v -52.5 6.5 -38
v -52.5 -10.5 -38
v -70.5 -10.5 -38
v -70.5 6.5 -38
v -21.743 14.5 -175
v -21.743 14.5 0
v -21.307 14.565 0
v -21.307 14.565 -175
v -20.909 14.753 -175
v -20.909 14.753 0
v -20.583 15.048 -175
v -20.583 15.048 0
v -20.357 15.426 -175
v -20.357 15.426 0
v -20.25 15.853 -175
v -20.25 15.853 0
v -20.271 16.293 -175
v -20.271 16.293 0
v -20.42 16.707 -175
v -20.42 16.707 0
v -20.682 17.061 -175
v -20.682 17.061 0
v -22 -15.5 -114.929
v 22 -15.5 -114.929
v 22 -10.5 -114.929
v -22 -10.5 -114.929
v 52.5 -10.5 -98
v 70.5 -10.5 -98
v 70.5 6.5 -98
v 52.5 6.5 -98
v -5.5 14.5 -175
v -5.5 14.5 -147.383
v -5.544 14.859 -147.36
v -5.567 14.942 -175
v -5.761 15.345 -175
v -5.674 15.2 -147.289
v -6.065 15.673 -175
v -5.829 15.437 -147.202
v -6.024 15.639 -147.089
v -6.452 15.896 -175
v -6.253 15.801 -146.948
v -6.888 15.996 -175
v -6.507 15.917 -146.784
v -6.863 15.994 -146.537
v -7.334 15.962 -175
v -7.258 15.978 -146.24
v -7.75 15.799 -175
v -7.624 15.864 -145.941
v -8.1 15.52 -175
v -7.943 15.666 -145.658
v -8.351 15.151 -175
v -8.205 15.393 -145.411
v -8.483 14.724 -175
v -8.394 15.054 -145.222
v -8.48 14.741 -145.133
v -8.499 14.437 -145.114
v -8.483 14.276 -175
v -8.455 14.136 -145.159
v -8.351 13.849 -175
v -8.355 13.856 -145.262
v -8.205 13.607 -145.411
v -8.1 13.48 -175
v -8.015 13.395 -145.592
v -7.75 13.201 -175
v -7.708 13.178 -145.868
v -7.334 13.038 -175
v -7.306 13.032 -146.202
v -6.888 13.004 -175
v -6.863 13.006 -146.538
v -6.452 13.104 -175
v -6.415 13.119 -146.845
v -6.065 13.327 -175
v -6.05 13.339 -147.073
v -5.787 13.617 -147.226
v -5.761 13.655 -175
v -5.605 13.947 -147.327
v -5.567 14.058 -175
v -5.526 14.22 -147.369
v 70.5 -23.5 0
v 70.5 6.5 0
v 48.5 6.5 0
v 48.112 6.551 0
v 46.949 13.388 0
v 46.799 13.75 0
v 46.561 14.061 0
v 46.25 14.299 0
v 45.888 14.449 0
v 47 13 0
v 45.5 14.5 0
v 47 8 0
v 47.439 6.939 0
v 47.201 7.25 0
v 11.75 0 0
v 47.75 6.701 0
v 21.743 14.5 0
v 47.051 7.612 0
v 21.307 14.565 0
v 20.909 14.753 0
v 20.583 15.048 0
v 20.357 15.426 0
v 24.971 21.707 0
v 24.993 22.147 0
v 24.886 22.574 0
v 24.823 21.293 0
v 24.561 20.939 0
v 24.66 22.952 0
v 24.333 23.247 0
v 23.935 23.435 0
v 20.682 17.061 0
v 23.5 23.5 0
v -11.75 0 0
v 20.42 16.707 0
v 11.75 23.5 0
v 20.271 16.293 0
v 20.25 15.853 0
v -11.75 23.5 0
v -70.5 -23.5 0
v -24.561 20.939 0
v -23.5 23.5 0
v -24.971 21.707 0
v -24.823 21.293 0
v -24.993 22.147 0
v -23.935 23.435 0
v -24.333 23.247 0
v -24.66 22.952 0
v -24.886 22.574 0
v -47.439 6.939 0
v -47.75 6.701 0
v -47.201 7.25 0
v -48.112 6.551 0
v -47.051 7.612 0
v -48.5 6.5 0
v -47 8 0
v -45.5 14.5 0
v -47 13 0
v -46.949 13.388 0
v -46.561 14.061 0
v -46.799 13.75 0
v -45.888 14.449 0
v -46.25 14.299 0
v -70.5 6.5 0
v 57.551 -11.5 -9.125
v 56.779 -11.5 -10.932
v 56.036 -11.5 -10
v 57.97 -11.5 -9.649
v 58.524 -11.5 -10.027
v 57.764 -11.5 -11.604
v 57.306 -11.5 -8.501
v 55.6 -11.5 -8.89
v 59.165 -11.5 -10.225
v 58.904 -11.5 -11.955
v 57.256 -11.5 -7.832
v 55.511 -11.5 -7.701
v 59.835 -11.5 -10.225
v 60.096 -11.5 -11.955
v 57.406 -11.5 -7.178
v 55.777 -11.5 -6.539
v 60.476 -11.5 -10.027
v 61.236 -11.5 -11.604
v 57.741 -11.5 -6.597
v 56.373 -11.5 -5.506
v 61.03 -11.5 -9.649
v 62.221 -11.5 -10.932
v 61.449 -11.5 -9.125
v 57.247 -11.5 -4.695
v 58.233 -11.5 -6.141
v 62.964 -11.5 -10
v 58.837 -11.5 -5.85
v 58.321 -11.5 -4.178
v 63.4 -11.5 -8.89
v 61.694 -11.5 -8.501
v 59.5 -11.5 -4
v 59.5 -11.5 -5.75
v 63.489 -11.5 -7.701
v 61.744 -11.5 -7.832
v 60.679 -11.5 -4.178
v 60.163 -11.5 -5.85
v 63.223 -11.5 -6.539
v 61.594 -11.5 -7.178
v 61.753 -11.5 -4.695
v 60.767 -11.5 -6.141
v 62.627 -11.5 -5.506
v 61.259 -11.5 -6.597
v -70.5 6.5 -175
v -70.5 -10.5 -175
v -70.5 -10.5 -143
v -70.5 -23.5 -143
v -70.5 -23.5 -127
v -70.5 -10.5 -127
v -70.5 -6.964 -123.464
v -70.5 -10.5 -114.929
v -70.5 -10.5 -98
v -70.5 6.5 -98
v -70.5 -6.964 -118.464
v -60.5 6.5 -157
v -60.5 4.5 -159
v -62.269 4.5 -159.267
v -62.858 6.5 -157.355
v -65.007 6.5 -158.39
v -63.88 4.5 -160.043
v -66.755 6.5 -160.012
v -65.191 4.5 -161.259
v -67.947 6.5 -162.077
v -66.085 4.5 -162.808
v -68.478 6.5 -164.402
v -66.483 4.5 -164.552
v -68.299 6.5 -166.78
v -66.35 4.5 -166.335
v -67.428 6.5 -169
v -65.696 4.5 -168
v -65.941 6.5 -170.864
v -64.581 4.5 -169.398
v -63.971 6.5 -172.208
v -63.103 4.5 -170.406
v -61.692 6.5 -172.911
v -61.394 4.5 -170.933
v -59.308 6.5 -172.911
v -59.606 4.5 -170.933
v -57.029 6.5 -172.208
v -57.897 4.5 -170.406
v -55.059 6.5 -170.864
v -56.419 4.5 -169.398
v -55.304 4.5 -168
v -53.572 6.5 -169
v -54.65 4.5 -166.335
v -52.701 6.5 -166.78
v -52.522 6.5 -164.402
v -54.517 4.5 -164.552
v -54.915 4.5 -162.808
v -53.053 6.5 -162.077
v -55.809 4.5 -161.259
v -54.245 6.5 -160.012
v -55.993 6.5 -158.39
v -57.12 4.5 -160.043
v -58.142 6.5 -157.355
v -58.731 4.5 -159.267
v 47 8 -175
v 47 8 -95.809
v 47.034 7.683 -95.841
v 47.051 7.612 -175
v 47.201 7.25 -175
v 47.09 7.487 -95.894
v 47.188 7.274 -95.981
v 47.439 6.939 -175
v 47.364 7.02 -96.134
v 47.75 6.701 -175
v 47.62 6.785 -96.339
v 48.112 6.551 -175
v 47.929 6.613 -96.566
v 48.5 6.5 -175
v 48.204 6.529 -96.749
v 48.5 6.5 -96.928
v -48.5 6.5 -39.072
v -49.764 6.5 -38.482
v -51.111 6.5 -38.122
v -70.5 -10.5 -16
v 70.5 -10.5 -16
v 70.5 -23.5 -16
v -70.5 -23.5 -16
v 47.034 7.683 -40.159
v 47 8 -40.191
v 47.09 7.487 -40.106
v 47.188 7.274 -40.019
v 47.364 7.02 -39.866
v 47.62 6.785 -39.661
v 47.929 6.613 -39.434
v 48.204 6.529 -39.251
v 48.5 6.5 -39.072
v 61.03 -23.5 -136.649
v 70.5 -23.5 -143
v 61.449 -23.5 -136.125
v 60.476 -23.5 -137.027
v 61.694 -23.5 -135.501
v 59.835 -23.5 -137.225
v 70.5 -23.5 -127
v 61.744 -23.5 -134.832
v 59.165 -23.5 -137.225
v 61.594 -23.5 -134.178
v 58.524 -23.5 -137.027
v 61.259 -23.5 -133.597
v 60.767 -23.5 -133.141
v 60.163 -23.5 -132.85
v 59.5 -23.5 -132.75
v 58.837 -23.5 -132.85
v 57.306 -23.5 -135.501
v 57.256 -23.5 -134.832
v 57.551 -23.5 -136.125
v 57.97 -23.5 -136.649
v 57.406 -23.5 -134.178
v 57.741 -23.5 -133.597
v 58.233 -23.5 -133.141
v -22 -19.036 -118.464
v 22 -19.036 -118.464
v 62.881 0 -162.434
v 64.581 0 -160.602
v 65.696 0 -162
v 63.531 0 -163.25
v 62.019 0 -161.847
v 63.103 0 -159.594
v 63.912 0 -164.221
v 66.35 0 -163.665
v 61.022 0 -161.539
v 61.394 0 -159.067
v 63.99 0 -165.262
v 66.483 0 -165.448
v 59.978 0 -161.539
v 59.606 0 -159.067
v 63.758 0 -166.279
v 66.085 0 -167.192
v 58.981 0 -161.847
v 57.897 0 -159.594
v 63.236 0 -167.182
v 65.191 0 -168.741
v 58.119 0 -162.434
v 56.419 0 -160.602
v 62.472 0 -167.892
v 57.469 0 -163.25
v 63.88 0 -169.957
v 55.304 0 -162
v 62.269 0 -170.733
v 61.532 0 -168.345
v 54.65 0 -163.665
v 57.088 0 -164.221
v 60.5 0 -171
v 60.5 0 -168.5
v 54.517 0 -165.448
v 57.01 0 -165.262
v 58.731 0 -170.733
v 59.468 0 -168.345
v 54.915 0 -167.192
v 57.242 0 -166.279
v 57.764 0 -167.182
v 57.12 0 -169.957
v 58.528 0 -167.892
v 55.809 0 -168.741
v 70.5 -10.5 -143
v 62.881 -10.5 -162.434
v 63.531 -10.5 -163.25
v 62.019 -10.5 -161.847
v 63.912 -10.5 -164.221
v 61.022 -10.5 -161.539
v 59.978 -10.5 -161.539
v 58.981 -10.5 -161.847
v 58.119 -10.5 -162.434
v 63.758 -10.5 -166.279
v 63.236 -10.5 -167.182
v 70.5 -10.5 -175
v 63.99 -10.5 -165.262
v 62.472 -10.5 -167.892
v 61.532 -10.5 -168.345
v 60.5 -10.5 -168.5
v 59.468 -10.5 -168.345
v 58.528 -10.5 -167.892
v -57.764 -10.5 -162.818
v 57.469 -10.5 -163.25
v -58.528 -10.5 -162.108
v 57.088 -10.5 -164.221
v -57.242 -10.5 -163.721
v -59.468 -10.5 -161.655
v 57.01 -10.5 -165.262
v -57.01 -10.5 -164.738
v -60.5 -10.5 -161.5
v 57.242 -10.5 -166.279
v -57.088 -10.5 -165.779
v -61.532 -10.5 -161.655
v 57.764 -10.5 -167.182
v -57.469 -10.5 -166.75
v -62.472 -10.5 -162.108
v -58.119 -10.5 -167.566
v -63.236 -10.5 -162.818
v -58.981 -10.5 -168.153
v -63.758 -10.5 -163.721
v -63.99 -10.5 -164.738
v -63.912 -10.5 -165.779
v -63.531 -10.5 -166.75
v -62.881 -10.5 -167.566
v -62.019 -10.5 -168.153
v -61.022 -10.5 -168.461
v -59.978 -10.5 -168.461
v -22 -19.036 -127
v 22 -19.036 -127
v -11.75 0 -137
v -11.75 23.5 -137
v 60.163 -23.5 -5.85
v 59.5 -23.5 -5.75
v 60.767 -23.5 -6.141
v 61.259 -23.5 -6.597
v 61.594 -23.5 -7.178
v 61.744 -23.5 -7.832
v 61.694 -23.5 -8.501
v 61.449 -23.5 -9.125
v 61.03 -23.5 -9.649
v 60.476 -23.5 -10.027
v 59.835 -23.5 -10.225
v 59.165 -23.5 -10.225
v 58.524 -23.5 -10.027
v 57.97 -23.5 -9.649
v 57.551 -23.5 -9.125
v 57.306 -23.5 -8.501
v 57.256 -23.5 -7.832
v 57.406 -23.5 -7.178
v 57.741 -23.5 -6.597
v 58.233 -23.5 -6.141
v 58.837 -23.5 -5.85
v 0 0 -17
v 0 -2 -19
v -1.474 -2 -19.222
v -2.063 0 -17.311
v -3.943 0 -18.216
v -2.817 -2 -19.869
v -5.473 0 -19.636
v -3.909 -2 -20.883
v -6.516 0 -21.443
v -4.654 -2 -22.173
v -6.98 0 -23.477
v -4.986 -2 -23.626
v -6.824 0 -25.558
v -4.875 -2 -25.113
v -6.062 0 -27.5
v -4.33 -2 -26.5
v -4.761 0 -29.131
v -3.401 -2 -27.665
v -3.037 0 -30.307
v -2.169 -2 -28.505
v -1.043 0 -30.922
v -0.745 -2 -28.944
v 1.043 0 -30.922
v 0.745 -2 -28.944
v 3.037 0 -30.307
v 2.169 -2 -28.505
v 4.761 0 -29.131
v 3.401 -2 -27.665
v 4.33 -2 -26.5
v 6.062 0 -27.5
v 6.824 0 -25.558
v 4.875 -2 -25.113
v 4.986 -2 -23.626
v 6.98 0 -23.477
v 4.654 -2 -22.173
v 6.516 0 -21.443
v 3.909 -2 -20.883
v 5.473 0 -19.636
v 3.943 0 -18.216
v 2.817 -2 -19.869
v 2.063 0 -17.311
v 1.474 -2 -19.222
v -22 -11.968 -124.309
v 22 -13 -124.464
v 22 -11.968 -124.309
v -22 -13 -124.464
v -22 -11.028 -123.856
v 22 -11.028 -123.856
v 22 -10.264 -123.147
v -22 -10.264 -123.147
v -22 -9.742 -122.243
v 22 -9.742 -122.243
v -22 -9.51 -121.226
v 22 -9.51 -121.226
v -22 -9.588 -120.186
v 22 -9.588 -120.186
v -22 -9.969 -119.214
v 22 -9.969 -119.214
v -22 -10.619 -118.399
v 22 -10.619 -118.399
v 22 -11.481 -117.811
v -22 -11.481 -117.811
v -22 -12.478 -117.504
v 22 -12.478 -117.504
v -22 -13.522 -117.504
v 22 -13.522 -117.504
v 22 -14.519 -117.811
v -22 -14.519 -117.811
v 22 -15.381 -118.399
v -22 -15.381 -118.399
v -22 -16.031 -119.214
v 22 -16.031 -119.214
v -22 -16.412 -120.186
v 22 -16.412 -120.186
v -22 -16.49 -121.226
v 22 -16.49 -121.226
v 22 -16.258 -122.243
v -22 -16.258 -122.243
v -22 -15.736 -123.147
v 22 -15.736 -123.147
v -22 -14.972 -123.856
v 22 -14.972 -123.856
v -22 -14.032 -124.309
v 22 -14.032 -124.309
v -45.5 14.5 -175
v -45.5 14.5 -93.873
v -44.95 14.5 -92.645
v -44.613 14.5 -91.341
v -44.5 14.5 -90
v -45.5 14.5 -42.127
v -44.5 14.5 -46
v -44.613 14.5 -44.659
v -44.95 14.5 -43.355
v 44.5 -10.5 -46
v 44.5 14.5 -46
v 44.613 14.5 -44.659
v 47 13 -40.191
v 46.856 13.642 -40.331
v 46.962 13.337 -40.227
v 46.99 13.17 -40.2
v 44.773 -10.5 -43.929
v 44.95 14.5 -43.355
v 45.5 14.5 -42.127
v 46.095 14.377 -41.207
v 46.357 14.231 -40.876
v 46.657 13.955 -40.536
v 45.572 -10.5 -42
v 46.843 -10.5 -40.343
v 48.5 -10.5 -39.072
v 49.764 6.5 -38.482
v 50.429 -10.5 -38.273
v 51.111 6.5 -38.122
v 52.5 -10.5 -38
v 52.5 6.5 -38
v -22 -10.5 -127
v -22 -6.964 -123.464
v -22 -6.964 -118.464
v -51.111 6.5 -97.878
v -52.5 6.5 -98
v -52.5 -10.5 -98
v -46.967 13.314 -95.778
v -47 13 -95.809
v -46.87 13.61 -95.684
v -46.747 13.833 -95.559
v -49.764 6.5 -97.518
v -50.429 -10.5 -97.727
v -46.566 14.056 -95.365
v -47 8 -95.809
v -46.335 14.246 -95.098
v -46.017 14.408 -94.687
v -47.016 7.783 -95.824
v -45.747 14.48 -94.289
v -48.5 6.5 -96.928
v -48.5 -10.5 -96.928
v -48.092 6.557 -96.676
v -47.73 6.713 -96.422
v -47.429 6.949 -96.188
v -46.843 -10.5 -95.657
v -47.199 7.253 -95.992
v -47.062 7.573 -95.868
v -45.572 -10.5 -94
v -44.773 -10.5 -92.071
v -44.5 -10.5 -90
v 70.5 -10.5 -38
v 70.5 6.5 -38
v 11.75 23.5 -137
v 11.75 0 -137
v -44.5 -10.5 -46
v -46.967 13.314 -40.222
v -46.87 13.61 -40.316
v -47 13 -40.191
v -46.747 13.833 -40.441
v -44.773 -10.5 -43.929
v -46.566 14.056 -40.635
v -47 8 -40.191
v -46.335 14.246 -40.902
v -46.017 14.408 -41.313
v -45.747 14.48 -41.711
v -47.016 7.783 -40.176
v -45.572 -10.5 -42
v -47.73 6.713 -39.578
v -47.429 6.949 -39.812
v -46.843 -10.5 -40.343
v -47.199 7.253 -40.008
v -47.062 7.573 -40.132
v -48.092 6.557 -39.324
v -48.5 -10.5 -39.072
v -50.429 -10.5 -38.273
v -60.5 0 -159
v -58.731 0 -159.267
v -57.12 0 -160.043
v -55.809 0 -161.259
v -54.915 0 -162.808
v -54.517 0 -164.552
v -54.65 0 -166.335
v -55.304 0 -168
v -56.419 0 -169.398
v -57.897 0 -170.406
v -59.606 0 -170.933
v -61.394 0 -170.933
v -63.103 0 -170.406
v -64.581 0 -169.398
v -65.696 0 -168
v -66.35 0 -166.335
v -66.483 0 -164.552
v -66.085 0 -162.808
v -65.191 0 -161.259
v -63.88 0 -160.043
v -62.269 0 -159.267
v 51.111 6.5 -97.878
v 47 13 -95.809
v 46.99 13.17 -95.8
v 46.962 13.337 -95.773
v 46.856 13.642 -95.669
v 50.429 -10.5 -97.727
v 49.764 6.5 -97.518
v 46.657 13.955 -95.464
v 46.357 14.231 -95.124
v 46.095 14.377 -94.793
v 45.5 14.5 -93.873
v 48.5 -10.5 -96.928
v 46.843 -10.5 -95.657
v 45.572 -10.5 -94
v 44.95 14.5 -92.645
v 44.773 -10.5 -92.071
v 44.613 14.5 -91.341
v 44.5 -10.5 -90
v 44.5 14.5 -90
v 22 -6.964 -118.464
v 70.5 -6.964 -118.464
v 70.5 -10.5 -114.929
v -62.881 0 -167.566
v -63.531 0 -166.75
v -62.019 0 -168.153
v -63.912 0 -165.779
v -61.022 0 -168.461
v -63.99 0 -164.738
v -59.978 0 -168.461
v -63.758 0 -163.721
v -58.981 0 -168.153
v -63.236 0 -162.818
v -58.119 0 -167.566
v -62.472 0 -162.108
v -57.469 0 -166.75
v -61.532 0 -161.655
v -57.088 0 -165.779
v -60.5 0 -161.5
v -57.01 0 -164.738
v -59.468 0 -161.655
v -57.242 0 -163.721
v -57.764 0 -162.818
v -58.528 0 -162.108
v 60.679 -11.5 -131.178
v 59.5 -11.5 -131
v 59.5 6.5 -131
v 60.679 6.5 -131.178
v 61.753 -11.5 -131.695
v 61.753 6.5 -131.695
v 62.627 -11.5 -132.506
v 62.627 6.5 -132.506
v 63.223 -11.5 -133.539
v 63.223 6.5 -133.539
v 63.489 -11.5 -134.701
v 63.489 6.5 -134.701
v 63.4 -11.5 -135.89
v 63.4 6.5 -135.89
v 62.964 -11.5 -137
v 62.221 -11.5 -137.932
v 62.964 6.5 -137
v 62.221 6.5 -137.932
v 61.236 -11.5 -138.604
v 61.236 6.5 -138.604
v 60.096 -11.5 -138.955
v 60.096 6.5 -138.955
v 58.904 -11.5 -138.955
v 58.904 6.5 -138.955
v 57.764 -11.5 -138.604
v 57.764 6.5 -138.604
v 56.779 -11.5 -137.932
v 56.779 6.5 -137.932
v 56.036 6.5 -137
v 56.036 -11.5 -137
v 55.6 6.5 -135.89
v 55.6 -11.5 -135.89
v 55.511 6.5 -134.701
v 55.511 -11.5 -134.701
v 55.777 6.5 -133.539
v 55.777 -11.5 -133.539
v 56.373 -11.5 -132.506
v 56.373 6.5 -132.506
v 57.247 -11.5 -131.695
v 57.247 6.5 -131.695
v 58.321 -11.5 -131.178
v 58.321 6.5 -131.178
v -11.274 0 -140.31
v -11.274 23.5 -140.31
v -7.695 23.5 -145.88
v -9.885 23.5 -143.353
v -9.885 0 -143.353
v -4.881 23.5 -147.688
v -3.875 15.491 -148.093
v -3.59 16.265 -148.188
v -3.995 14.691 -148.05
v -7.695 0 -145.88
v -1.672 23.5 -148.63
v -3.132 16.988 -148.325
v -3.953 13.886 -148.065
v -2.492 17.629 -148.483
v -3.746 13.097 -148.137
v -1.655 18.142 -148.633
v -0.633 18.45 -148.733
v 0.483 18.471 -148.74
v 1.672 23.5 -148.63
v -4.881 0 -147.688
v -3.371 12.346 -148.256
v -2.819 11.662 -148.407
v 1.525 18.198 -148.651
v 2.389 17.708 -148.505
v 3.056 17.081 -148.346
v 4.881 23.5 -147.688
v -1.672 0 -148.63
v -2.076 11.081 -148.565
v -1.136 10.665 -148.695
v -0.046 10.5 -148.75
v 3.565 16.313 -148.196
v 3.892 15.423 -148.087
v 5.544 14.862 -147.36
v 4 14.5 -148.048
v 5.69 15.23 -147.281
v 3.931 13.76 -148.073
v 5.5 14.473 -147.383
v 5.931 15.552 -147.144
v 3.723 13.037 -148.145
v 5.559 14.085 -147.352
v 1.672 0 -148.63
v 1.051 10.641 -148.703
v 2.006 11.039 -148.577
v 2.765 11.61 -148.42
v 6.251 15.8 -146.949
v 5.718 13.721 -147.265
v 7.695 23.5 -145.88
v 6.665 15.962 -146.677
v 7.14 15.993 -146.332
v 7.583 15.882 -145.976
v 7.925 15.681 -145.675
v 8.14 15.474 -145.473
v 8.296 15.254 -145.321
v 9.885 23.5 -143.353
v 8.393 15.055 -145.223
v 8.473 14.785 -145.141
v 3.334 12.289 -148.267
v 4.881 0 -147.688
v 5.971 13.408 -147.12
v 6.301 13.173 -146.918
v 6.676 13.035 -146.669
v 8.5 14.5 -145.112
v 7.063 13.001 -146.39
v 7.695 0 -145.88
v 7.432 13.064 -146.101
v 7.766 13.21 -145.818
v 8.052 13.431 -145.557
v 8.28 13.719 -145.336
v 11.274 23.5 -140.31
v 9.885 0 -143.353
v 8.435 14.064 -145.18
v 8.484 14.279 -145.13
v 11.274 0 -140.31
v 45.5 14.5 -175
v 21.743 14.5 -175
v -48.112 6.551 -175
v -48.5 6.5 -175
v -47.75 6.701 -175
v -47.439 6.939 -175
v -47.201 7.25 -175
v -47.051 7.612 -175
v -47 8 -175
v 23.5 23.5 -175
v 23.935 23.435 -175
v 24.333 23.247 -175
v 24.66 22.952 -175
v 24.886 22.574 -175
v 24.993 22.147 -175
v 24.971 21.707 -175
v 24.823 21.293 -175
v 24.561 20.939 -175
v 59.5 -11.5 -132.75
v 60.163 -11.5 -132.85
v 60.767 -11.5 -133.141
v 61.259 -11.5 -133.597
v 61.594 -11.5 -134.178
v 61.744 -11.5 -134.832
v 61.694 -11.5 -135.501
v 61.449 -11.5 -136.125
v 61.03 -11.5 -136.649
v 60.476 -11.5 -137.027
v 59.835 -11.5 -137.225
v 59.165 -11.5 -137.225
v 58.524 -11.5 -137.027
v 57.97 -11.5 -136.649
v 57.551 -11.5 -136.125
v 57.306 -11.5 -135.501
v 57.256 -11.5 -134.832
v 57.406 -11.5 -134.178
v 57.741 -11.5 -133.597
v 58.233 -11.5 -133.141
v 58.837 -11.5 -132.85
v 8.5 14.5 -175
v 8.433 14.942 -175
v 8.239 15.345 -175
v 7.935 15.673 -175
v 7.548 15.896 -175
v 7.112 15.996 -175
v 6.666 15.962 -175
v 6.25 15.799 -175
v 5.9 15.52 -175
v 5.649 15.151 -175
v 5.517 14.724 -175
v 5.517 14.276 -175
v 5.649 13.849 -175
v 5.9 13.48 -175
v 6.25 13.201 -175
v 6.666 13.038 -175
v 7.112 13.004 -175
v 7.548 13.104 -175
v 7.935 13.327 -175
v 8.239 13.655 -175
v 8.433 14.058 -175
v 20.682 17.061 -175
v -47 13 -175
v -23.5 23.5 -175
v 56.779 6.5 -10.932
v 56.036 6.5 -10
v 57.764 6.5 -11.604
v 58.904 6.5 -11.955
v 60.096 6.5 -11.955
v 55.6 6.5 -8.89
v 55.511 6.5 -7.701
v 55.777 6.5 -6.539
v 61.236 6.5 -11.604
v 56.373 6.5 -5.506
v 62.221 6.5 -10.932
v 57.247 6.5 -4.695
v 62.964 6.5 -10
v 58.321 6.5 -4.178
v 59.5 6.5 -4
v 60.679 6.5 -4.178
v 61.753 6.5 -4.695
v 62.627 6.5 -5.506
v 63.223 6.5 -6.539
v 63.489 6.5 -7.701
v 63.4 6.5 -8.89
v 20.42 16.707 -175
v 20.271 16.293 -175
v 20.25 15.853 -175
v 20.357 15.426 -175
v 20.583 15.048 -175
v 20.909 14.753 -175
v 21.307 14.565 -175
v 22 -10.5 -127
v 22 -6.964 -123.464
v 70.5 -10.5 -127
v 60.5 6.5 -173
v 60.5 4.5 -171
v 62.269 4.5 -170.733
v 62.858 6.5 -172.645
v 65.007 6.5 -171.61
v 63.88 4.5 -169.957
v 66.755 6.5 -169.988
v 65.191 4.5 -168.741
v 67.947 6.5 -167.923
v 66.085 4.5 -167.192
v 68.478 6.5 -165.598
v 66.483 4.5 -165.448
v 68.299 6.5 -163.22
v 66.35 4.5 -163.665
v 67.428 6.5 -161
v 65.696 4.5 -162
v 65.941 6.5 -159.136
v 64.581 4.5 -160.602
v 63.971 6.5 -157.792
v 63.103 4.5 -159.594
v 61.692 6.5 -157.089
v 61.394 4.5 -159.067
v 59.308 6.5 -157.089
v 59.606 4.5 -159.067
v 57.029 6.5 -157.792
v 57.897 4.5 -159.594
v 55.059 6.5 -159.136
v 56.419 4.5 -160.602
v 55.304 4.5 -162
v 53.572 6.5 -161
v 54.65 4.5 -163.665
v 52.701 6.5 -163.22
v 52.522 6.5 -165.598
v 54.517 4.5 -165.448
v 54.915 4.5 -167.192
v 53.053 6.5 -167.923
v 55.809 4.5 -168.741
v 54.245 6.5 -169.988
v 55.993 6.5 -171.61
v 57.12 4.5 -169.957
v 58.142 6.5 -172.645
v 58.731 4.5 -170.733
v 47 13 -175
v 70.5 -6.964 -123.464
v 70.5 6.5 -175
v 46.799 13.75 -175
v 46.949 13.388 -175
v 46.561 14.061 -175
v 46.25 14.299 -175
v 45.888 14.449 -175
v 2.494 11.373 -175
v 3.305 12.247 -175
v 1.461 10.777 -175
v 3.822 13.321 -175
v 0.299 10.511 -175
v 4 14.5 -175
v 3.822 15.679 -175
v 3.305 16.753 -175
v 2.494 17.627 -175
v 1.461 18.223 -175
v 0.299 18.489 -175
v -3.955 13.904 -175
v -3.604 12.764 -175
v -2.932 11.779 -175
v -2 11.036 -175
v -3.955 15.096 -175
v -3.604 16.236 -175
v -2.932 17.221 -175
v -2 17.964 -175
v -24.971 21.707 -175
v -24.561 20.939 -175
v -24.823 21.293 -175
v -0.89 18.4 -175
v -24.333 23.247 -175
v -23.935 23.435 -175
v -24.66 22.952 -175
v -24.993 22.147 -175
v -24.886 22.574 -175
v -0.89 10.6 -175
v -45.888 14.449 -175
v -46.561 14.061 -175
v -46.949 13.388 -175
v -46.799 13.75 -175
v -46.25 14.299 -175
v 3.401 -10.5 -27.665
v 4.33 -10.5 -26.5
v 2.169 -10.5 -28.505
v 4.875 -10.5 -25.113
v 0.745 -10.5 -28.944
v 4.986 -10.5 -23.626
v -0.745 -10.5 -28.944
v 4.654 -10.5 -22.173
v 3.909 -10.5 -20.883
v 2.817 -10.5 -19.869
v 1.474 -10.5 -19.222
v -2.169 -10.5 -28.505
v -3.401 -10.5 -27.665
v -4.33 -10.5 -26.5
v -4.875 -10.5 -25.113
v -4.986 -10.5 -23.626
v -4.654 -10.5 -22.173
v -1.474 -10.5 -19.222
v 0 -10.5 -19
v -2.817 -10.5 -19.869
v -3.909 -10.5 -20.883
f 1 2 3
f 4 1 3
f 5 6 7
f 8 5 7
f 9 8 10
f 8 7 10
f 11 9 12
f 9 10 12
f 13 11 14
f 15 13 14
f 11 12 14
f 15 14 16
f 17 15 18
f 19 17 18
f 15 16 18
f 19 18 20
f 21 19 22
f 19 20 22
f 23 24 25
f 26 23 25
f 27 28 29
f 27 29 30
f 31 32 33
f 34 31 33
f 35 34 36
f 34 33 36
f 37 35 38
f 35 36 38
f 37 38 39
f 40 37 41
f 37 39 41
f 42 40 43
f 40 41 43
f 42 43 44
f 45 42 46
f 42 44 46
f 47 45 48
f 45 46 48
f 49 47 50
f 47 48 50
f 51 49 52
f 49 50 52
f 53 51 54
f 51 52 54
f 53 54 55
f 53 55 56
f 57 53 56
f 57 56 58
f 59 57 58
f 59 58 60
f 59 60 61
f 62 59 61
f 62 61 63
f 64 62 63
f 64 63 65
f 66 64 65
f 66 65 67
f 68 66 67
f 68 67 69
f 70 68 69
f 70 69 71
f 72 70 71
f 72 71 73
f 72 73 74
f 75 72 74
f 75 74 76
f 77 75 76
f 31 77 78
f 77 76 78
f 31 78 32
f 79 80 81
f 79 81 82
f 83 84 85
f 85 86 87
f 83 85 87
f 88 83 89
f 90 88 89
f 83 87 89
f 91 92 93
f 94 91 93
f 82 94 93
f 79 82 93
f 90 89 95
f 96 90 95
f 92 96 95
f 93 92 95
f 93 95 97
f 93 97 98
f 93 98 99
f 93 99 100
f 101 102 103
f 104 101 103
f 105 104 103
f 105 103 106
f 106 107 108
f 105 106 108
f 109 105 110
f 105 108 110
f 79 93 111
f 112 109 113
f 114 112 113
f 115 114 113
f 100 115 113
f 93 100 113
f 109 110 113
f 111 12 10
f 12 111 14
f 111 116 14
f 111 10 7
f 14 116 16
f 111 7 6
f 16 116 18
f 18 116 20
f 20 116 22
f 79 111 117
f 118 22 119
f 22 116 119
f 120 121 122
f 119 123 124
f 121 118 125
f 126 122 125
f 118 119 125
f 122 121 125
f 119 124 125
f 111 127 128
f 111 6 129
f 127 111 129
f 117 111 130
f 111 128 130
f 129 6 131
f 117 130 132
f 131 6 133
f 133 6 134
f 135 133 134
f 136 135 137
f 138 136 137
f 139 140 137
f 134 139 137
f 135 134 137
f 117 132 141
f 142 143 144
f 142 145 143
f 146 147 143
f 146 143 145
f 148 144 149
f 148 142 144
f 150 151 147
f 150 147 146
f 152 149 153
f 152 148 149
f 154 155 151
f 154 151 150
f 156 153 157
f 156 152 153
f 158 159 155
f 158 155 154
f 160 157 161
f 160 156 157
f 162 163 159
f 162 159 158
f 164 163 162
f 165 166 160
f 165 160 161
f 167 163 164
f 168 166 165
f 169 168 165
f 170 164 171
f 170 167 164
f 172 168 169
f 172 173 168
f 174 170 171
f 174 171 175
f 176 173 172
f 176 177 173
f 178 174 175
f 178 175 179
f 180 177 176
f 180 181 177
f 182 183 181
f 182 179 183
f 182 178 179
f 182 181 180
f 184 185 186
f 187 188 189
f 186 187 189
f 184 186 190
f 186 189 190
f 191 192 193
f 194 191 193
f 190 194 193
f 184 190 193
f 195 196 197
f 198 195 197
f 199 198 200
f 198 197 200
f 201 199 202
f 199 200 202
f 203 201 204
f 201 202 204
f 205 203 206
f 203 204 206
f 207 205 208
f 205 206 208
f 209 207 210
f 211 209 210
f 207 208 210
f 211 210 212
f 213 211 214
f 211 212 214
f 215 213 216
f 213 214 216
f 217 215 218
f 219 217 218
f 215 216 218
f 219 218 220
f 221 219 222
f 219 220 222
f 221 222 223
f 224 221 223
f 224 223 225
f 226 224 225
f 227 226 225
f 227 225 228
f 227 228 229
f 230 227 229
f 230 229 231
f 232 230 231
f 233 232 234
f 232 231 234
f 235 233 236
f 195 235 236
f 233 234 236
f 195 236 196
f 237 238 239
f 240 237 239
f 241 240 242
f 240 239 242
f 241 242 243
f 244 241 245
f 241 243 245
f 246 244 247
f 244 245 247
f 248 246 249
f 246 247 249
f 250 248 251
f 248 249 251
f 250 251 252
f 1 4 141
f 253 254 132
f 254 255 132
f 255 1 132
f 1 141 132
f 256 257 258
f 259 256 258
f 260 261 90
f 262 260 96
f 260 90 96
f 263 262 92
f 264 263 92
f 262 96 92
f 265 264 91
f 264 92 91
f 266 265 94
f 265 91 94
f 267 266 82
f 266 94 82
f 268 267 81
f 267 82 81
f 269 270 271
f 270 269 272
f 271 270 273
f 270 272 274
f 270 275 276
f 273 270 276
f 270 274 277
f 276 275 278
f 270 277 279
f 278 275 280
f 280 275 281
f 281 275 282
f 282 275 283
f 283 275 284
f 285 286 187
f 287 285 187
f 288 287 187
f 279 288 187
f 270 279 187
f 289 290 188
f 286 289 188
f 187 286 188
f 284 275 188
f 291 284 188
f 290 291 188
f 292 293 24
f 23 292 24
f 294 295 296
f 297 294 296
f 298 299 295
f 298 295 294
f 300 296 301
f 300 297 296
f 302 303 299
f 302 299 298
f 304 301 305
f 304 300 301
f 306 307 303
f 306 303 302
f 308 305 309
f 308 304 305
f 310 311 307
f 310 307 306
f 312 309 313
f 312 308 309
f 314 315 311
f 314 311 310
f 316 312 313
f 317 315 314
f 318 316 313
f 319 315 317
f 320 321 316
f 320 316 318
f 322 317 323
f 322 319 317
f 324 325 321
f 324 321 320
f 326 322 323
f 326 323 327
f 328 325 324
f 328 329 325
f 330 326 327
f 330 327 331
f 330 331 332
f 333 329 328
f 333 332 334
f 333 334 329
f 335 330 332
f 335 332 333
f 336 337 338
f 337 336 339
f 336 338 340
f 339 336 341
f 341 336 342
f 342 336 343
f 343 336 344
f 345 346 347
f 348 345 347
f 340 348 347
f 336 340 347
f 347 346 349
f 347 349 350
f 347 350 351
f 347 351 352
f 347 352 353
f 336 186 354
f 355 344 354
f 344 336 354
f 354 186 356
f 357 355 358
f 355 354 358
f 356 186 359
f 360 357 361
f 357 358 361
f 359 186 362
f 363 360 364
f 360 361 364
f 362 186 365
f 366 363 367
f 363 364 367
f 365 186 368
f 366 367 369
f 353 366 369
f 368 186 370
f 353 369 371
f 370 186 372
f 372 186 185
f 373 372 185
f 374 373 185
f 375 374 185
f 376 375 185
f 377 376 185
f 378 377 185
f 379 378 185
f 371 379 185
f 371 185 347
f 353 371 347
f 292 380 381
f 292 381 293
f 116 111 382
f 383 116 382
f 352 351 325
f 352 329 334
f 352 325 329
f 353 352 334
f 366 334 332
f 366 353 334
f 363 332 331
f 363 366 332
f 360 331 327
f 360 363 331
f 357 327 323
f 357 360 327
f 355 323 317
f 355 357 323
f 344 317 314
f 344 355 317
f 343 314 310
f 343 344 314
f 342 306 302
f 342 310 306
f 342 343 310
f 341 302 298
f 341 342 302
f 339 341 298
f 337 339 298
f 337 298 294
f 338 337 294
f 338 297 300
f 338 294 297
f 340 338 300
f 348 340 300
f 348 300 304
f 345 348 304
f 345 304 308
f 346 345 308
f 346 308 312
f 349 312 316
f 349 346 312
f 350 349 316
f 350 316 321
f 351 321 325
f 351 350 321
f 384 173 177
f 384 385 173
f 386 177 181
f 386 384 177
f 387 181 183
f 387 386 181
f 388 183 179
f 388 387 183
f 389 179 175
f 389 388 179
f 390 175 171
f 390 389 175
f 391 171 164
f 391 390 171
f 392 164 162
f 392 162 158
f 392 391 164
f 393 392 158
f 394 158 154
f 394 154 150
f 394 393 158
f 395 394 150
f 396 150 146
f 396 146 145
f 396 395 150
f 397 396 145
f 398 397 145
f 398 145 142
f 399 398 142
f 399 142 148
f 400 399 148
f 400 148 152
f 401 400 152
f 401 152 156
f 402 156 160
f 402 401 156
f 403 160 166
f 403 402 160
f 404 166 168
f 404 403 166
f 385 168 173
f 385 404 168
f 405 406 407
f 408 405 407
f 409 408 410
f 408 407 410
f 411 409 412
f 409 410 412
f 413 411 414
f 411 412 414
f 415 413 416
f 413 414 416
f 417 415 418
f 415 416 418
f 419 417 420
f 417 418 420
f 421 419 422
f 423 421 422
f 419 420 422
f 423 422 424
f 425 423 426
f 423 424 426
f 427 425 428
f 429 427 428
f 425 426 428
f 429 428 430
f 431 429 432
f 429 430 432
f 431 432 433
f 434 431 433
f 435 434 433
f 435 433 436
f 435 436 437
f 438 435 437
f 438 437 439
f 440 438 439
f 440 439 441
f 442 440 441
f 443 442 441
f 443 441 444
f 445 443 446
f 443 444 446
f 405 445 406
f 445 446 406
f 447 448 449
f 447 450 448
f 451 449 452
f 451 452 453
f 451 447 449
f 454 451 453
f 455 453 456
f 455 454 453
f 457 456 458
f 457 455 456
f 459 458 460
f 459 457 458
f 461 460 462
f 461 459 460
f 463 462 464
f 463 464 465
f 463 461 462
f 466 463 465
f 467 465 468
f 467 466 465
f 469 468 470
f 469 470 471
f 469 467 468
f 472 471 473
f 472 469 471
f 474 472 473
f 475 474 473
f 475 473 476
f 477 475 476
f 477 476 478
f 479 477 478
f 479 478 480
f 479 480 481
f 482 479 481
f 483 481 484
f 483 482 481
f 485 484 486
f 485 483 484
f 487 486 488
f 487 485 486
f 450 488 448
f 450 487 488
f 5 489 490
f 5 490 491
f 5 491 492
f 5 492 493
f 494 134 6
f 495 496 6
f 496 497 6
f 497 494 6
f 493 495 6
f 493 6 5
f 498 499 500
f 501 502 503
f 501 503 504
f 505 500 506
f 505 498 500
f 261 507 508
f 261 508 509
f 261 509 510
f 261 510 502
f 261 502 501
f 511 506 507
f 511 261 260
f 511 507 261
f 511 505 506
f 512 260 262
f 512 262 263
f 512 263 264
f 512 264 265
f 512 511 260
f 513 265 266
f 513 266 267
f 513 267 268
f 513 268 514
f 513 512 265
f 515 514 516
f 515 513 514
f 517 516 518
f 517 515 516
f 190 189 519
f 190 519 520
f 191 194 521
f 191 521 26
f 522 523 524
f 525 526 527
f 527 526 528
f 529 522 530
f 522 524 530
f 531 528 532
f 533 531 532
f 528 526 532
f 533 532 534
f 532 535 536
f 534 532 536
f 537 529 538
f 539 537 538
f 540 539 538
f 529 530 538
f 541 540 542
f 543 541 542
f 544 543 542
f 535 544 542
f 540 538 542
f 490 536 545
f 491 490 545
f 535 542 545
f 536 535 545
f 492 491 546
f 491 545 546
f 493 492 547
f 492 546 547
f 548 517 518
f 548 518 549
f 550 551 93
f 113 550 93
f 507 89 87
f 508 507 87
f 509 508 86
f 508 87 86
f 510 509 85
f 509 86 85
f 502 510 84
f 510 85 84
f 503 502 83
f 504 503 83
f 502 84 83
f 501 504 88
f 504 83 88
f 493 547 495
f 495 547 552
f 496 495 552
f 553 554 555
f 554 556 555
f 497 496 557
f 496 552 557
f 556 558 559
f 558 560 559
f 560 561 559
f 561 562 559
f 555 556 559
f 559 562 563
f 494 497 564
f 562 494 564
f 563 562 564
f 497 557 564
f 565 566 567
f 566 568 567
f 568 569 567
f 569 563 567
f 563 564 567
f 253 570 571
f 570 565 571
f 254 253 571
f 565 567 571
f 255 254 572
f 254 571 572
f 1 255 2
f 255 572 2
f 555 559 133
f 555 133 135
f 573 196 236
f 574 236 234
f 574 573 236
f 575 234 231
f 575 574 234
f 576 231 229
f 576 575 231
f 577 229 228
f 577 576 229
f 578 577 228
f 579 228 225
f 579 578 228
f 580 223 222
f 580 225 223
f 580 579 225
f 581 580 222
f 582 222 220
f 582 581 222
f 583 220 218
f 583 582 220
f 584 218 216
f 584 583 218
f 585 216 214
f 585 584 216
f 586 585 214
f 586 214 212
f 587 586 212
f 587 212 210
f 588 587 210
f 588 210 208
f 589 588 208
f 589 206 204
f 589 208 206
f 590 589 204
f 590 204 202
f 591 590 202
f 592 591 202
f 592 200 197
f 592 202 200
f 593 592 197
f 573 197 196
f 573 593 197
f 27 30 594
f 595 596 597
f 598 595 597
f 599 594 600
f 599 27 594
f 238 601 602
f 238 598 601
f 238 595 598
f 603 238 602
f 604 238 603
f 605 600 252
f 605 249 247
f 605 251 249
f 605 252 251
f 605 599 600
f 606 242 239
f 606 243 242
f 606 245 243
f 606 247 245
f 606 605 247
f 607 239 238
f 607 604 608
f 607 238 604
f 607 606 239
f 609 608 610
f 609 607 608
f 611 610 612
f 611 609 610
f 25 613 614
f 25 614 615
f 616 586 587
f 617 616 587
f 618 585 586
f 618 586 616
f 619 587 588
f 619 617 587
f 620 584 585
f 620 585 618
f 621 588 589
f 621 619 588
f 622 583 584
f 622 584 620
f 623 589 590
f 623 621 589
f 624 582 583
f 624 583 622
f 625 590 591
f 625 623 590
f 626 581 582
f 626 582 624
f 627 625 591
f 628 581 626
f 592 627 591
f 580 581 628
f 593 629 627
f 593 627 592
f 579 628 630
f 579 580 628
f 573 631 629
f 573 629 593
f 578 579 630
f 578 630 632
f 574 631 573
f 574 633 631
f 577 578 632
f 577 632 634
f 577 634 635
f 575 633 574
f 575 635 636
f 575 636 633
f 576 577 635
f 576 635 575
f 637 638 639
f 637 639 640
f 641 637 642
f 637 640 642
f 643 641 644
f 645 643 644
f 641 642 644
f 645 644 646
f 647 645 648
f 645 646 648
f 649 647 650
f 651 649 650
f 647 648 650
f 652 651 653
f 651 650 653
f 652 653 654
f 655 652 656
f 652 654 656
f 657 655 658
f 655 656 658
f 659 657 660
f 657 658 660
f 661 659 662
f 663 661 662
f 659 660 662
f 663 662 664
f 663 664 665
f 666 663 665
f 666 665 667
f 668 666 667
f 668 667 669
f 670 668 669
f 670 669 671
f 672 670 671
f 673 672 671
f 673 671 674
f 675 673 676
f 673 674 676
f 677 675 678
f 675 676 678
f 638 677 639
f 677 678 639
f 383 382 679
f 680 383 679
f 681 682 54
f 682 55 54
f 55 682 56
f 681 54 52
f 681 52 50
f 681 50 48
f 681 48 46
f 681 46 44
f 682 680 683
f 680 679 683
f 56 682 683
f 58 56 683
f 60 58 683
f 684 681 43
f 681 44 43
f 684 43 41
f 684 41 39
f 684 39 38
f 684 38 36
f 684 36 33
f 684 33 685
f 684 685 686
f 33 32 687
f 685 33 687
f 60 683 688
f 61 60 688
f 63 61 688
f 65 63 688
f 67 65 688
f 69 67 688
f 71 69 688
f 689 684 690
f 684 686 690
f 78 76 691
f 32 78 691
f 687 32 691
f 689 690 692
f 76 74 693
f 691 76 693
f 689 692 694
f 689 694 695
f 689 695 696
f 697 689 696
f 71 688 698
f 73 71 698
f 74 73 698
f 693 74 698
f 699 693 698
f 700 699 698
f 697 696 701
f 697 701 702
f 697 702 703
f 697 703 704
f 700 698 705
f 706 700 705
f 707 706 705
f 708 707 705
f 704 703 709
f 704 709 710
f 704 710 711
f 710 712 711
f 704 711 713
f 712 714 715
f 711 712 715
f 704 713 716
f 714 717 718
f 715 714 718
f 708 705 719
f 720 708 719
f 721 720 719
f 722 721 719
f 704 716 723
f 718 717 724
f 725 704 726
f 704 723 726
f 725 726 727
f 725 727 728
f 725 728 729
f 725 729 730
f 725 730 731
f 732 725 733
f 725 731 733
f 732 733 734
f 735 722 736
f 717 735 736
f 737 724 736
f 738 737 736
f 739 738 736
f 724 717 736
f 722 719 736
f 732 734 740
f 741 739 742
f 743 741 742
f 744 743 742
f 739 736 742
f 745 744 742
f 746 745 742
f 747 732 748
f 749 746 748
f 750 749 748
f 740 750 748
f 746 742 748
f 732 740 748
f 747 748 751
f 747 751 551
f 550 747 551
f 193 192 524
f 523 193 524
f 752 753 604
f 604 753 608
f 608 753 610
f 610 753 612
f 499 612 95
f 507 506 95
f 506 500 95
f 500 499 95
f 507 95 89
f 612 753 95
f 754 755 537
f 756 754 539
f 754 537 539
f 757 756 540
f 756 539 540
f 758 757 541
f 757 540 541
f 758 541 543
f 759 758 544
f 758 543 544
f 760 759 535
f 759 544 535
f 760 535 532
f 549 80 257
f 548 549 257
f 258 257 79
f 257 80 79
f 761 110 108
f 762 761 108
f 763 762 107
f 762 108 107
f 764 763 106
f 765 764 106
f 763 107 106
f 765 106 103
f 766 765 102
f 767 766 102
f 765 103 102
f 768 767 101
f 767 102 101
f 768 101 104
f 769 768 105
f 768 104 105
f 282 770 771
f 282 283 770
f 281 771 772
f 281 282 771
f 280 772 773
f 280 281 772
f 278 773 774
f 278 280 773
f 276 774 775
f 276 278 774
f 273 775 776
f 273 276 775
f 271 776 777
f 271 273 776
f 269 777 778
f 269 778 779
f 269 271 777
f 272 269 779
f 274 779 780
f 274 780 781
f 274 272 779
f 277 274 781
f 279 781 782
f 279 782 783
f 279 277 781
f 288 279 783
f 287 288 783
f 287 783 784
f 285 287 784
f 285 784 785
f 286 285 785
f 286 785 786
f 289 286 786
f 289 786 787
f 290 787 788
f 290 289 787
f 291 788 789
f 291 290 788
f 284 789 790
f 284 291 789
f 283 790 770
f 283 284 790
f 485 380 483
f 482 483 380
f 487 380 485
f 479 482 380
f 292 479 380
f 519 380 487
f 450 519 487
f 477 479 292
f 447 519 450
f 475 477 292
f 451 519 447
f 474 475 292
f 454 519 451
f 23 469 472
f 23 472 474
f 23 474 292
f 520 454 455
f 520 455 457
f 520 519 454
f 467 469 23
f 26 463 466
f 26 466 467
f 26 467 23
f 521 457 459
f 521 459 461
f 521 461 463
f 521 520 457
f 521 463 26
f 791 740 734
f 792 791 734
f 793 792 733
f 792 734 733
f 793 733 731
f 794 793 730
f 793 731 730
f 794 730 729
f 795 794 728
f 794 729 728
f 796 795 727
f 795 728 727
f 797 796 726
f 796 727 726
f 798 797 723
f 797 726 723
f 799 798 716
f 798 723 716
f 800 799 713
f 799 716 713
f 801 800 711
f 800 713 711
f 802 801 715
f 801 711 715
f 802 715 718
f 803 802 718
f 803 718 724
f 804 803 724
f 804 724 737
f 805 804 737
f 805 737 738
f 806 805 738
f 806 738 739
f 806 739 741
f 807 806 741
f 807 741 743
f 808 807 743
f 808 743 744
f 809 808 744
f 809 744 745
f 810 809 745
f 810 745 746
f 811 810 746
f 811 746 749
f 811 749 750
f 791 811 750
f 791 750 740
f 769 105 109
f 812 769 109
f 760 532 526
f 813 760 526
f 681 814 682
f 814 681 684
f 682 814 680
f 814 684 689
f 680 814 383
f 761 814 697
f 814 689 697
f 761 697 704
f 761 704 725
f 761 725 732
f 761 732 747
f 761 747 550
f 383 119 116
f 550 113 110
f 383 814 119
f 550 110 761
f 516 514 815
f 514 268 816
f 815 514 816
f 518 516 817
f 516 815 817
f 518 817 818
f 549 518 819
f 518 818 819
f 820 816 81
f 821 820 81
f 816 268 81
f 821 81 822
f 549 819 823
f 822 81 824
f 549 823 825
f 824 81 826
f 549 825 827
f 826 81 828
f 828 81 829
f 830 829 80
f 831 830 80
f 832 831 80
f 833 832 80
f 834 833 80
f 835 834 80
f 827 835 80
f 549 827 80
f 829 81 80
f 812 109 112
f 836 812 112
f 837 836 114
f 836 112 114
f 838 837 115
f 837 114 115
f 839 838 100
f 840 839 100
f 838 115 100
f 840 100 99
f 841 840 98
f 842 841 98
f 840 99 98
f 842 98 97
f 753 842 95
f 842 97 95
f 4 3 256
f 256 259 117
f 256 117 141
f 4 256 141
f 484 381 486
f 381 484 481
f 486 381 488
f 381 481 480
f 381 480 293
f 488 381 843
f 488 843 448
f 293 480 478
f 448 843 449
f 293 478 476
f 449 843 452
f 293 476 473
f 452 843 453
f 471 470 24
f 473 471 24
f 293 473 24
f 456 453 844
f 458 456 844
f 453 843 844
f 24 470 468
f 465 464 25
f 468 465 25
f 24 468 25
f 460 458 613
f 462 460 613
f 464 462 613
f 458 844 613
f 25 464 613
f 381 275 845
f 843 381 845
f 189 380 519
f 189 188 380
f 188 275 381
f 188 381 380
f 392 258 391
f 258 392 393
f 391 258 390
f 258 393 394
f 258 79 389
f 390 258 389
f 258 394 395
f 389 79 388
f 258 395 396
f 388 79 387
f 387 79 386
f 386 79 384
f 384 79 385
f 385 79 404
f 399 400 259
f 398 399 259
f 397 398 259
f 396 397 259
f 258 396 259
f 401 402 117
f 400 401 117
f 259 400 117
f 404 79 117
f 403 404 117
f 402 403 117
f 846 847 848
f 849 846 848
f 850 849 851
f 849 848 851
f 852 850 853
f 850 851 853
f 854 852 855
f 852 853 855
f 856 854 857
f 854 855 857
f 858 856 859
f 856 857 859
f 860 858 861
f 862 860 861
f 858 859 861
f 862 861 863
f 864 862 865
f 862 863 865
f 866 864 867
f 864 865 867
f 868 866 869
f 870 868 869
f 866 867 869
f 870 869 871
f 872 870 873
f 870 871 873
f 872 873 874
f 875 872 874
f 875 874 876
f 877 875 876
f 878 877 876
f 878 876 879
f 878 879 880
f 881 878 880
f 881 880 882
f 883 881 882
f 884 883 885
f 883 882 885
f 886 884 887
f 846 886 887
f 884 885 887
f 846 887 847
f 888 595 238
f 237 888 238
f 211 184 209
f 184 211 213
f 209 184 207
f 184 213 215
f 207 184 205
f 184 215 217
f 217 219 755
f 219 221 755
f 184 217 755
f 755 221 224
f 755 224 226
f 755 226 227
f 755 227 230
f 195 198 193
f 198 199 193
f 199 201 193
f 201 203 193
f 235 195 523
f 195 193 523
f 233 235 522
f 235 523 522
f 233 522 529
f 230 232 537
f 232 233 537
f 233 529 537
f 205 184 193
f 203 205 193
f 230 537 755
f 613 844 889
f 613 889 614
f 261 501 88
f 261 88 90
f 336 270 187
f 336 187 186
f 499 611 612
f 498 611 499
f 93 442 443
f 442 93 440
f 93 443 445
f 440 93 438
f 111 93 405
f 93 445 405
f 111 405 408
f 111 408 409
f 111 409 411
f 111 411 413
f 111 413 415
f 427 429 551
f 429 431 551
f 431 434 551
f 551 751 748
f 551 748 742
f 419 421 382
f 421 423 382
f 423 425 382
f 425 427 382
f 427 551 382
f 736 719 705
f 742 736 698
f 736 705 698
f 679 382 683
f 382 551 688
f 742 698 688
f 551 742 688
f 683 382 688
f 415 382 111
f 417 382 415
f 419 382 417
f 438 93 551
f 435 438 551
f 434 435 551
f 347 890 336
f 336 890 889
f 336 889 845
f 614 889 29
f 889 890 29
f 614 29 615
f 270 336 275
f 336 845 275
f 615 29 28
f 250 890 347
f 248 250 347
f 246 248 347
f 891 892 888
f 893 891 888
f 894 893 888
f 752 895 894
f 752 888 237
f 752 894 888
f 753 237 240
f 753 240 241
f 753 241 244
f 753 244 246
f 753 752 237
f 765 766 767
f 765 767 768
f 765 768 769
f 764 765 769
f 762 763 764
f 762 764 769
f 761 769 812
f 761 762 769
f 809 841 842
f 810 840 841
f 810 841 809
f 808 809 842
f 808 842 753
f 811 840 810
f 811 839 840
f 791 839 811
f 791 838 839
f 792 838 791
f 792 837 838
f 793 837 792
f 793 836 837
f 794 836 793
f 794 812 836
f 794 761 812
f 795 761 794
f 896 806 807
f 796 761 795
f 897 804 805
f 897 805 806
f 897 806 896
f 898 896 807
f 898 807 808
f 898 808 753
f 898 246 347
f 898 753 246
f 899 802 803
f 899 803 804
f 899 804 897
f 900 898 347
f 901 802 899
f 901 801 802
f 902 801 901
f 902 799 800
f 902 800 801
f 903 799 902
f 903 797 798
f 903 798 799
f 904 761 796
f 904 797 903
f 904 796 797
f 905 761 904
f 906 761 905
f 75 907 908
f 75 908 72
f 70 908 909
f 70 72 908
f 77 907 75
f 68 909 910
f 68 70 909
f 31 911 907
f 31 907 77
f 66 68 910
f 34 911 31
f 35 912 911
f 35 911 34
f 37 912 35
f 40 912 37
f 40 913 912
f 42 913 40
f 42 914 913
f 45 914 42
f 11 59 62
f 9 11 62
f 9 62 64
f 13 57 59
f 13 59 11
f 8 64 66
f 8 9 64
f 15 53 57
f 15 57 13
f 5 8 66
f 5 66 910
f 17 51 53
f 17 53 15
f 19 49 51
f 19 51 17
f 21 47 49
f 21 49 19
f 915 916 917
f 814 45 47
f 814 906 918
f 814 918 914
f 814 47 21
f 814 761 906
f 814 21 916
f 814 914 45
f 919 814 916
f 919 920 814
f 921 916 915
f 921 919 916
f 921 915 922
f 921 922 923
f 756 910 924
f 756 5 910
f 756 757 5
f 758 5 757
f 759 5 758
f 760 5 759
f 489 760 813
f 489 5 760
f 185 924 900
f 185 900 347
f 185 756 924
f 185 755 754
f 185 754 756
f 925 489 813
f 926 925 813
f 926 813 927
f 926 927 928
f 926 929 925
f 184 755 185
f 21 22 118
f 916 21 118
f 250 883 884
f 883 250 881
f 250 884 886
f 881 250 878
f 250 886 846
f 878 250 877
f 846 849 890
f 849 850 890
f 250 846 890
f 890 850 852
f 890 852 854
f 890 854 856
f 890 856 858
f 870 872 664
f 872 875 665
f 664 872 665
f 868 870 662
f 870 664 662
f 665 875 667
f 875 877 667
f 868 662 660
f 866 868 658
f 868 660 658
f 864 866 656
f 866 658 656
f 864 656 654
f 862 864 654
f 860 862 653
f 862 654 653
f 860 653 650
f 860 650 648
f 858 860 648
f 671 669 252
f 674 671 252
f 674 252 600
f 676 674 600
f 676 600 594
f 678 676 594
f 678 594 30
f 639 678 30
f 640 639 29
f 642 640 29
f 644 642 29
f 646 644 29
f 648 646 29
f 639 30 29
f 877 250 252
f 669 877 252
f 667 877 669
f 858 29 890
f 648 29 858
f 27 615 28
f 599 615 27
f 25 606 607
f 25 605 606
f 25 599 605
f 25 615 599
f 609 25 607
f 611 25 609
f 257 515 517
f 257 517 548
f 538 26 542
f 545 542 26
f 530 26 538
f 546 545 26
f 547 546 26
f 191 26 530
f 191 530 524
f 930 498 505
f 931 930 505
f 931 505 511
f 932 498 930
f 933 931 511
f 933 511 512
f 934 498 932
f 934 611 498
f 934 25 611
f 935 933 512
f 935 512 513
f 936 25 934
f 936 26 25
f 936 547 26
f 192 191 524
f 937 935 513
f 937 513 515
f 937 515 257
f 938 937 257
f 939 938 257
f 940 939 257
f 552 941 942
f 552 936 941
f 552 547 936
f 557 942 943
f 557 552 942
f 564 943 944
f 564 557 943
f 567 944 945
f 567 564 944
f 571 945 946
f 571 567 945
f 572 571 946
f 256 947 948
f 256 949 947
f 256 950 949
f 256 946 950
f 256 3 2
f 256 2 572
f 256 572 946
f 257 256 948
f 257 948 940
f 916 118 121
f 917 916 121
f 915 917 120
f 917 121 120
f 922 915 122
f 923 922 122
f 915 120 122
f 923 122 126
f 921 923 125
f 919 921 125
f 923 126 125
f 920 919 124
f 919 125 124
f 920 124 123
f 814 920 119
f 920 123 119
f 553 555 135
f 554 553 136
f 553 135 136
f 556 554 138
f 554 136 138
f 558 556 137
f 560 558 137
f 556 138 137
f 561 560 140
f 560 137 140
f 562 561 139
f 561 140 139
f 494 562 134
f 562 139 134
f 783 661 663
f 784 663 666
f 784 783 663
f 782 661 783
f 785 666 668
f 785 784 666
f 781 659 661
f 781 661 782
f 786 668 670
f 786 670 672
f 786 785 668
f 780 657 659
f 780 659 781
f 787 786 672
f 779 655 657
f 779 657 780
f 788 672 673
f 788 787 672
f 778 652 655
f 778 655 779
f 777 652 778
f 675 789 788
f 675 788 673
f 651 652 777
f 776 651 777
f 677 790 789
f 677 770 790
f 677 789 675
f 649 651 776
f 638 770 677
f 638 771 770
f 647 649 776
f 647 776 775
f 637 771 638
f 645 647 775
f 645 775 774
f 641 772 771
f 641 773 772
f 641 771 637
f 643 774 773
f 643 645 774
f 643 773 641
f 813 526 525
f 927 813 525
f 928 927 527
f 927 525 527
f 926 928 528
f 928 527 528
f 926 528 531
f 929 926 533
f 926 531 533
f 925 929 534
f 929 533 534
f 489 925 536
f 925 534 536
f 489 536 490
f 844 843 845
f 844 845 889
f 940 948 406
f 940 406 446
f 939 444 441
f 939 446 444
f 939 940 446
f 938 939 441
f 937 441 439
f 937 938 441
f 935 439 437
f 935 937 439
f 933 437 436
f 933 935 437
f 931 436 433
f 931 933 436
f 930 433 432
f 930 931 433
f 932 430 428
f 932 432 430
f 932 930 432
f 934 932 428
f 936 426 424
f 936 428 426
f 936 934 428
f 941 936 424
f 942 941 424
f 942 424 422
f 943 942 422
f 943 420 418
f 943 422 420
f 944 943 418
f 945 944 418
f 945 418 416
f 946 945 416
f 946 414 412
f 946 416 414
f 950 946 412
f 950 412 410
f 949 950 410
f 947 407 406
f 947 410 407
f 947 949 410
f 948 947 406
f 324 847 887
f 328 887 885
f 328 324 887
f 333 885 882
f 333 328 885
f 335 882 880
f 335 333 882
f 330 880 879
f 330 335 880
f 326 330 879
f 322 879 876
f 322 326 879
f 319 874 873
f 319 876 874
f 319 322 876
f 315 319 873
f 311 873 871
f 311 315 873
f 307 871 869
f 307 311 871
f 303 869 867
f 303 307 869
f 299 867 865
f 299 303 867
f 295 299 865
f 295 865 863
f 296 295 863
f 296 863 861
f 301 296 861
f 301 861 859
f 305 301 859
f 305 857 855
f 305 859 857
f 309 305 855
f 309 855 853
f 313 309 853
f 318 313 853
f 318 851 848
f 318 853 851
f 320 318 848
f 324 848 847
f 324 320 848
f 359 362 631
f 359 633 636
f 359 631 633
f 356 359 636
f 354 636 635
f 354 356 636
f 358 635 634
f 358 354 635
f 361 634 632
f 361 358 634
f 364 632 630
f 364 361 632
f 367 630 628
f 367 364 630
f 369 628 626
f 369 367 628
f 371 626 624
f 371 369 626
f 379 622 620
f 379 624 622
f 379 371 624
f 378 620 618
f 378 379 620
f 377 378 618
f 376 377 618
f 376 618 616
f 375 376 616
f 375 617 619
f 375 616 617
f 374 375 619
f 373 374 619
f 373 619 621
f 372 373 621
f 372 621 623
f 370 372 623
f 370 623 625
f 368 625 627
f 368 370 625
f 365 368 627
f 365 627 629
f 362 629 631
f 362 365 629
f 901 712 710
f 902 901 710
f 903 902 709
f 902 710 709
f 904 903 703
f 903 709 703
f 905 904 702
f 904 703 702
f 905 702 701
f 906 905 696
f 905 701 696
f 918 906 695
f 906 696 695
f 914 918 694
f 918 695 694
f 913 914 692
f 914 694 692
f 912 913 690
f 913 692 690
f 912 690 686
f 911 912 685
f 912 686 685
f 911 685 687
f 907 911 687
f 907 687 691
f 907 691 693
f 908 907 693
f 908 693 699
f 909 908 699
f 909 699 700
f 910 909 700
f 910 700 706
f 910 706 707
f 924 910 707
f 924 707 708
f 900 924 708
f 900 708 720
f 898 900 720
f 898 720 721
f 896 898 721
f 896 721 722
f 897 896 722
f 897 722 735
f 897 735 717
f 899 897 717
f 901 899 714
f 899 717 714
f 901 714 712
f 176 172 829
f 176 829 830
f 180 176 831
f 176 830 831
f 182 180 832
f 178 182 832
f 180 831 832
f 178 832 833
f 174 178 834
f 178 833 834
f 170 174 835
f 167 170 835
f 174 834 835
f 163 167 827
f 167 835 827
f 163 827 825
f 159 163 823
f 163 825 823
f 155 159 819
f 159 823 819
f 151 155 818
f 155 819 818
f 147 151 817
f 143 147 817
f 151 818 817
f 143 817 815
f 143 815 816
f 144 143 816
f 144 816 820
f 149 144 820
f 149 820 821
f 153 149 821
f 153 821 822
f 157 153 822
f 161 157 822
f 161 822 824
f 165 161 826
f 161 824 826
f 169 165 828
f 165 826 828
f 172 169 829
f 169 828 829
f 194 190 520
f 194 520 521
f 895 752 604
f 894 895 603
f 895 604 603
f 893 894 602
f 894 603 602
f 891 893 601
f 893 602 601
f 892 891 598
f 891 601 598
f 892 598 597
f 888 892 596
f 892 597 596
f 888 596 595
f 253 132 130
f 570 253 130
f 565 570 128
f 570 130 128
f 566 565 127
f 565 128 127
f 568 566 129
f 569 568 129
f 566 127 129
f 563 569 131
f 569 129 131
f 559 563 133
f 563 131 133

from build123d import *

# Parameters (mm, degrees)
SKETCH1_R               = 4
SKETCH1_R_2             = 1.5
BOSS_EXTRUDE1_DEPTH     = 175
SKETCH2_R               = 6
CUT_EXTRUDE1_DEPTH      = 191.124958909
CUT_EXTRUDE2_DEPTH      = 191.124959013
CUT_EXTRUDE2_DEPTH_BACK = 191.124959013
SKETCH3_R               = 3.5
SKETCH3_R_2             = 5
CUT_EXTRUDE3_DEPTH      = 191.124959013
CUT_EXTRUDE3_DEPTH_BACK = 191.124959013
SKETCH4_W               = 32
SKETCH4_H               = 13
CHAMFER1_SIZE           = 2
SKETCH5_R               = 3.5
BOSS_EXTRUDE2_DEPTH     = 22
SKETCH6_R               = 4
SKETCH6_R_2             = 2.25
CUT_EXTRUDE4_DEPTH      = 18
CUT_EXTRUDE5_DEPTH      = 192.037300114
CUT_EXTRUDE5_DEPTH_BACK = 192.037300114
SKETCH6_2_R             = 2.25


with BuildPart() as part:
    # Sketch1 → Boss-Extrude1 (new body)
    with BuildSketch(Plane.XY):
        with BuildLine():
            Line((24.560660172, 20.939339828), (20.681980515, 17.060660172))
            ThreePointArc((20.681980515, 17.060660172), (20.356821388, 15.425974851), (21.742640687, 14.5))
            Line((21.742640687, 14.5), (45.5, 14.5))
            ThreePointArc((45.5, 14.5), (46.560660172, 14.060660172), (47, 13))
            Line((47, 13), (47, 8))
            ThreePointArc((47, 8), (47.439339828, 6.939339828), (48.5, 6.5))
            Line((48.5, 6.5), (70.5, 6.5))
            Line((70.5, 6.5), (70.5, -23.5))
            Line((70.5, -23.5), (-70.5, -23.5))
            Line((-70.5, -23.5), (-70.5, 6.5))
            Line((-70.5, 6.5), (-48.5, 6.5))
            ThreePointArc((-48.5, 6.5), (-47.439339828, 6.939339828), (-47, 8))
            Line((-47, 8), (-47, 13))
            ThreePointArc((-47, 13), (-46.560660172, 14.060660172), (-45.5, 14.5))
            Line((-45.5, 14.5), (-21.742640687, 14.5))
            ThreePointArc((-21.742640687, 14.5), (-20.356821388, 15.425974851), (-20.681980515, 17.060660172))
            Line((-20.681980515, 17.060660172), (-24.560660172, 20.939339828))
            ThreePointArc((-24.560660172, 20.939339828), (-24.885819299, 22.574025149), (-23.5, 23.5))
            Line((-23.5, 23.5), (23.5, 23.5))
            ThreePointArc((23.5, 23.5), (24.885819299, 22.574025149), (24.560660172, 20.939339828))
        make_face()
        with Locations((0, 14.5)):
            Circle(SKETCH1_R, mode=Mode.SUBTRACT)
        with Locations((7, 14.5)):
            Circle(SKETCH1_R_2, mode=Mode.SUBTRACT)
        with Locations((-7, 14.5)):
            Circle(SKETCH1_R_2, mode=Mode.SUBTRACT)
    extrude(amount=-BOSS_EXTRUDE1_DEPTH)

    # Sketch2 → Cut-Extrude1 (cut, through all)
    with BuildSketch(Plane(origin=(0, 0, 0), x_dir=(1, 0, 0), z_dir=(0, 1, 0))):
        with Locations((-60.5, 165)):
            Circle(SKETCH2_R)
        with Locations((60.5, 165)):
            Circle(SKETCH2_R)
        with BuildLine():
            Line((-11.75, 0), (-11.75, 137))
            ThreePointArc((-11.75, 137), (0, 148.75), (11.75, 137))
            Line((11.75, 137), (11.75, 0))
            ThreePointArc((11.75, 0), (0, -11.75), (-11.75, 0))
        make_face()
    extrude(amount=CUT_EXTRUDE1_DEPTH, mode=Mode.SUBTRACT)

    # Sketch3 → Cut-Extrude2 (cut, two sides: drawn at the far end of the back side and taken through both)
    with BuildSketch(Plane(origin=(0, 0, 0), x_dir=(1, 0, 0), z_dir=(0, 1, 0)).offset(-CUT_EXTRUDE2_DEPTH_BACK)):
        with Locations((-60.5, 165)):
            Circle(SKETCH3_R)
        with Locations((0, 24)):
            Circle(SKETCH3_R_2)
        with Locations((60.5, 165)):
            Circle(SKETCH3_R)
        with BuildLine():
            Line((-70.5, 98), (-52.5, 98))
            ThreePointArc((-52.5, 98), (-46.843145751, 95.656854249), (-44.5, 90))
            Line((-44.5, 90), (-44.5, 46))
            ThreePointArc((-44.5, 46), (-46.843145751, 40.343145751), (-52.5, 38))
            Line((-52.5, 38), (-70.5, 38))
            Line((-70.5, 38), (-70.5, 98))
        make_face()
        with BuildLine():
            Line((70.5, 38), (70.5, 98))
            Line((70.5, 98), (52.5, 98))
            ThreePointArc((52.5, 98), (46.843145751, 95.656854249), (44.5, 90))
            Line((44.5, 90), (44.5, 46))
            ThreePointArc((44.5, 46), (46.843145751, 40.343145751), (52.5, 38))
            Line((52.5, 38), (70.5, 38))
        make_face()
    extrude(amount=CUT_EXTRUDE2_DEPTH + CUT_EXTRUDE2_DEPTH_BACK, mode=Mode.SUBTRACT)

    # Sketch4 → Cut-Extrude3 (cut, two sides: drawn at the far end of the back side and taken through both)
    with BuildSketch(Plane(origin=(0, 0, 0), x_dir=(0, 0, -1), z_dir=(1, 0, 0)).offset(-CUT_EXTRUDE3_DEPTH_BACK)):
        with Locations((159, -17)):
            Rectangle(SKETCH4_W, SKETCH4_H)
        Polygon((127, -23.5), (127, -10.5), (123.464466094, -6.964466094), (118.464466094, -6.964466094), (114.928932188, -10.5), (16, -10.5), (16, -23.5), align=None)
    extrude(amount=CUT_EXTRUDE3_DEPTH + CUT_EXTRUDE3_DEPTH_BACK, mode=Mode.SUBTRACT)

    # Chamfer1
    chamfer1_edges = [part.edges().sort_by_distance(p)[0] for p in [
        (-5, 0, -24),
        (-66.5, 6.5, -165),
        (54.5, 6.5, -165),
    ]]
    chamfer(chamfer1_edges, length=CHAMFER1_SIZE)

    # Sketch5 → Boss-Extrude2 (add, symmetric)
    with BuildSketch(Plane(origin=(0, 0, 0), x_dir=(0, 0, -1), z_dir=(1, 0, 0))):
        Polygon((118.464466094, -19.035533906), (127, -19.035533906), (127, -10.5), (123.464466094, -6.964466094), (118.464466094, -6.964466094), (114.928932188, -10.5), (114.928932188, -15.5), align=None)
        with Locations((120.964466094, -13)):
            Circle(SKETCH5_R, mode=Mode.SUBTRACT)
    extrude(amount=BOSS_EXTRUDE2_DEPTH, both=True)

    # Sketch6 → Cut-Extrude4 (cut)
    # profile 1 of 2: a face of its own
    with BuildSketch(Plane(origin=(0, 6.5, 0), x_dir=(1, 0, 0), z_dir=(0, 1, 0))):
        with Locations((59.5, 8)):
            Circle(SKETCH6_R)
        with Locations((59.5, 8)):
            Circle(SKETCH6_R_2, mode=Mode.SUBTRACT)
    # profile 2 of 2: a face of its own
    with BuildSketch(Plane(origin=(0, 6.5, 0), x_dir=(1, 0, 0), z_dir=(0, 1, 0))):
        with Locations((59.5, 135)):
            Circle(SKETCH6_R)
        with Locations((59.5, 135)):
            Circle(SKETCH6_R_2, mode=Mode.SUBTRACT)
    extrude(amount=-CUT_EXTRUDE4_DEPTH, mode=Mode.SUBTRACT)

    # Sketch6<2> → Cut-Extrude5 (cut, two sides: drawn at the far end of the back side and taken through both)
    with BuildSketch(Plane(origin=(0, 6.5, 0), x_dir=(1, 0, 0), z_dir=(0, 1, 0)).offset(-CUT_EXTRUDE5_DEPTH_BACK)):
        with Locations((59.5, 8)):
            Circle(SKETCH6_2_R)
        with Locations((59.5, 135)):
            Circle(SKETCH6_2_R)
    extrude(amount=CUT_EXTRUDE5_DEPTH + CUT_EXTRUDE5_DEPTH_BACK, mode=Mode.SUBTRACT)


solid = part.part
